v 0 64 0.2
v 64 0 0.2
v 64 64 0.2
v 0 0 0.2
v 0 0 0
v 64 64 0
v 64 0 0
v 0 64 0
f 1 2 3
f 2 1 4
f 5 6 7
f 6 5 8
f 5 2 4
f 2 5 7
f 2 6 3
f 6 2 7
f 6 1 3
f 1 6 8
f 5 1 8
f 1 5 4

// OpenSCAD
paneltype=4; // [2:P2, 2.5:P2.5, 3:P3, 4:P4, 5:P5, 6:P6]
LEDsPerRow=16;  // [8,16,32,64,128]
height=.2; // [.12:.04:.28]
xcells=LEDsPerRow; 
ycells=LEDsPerRow;

cube(size=[paneltype*xcells, paneltype*ycells, height]);
